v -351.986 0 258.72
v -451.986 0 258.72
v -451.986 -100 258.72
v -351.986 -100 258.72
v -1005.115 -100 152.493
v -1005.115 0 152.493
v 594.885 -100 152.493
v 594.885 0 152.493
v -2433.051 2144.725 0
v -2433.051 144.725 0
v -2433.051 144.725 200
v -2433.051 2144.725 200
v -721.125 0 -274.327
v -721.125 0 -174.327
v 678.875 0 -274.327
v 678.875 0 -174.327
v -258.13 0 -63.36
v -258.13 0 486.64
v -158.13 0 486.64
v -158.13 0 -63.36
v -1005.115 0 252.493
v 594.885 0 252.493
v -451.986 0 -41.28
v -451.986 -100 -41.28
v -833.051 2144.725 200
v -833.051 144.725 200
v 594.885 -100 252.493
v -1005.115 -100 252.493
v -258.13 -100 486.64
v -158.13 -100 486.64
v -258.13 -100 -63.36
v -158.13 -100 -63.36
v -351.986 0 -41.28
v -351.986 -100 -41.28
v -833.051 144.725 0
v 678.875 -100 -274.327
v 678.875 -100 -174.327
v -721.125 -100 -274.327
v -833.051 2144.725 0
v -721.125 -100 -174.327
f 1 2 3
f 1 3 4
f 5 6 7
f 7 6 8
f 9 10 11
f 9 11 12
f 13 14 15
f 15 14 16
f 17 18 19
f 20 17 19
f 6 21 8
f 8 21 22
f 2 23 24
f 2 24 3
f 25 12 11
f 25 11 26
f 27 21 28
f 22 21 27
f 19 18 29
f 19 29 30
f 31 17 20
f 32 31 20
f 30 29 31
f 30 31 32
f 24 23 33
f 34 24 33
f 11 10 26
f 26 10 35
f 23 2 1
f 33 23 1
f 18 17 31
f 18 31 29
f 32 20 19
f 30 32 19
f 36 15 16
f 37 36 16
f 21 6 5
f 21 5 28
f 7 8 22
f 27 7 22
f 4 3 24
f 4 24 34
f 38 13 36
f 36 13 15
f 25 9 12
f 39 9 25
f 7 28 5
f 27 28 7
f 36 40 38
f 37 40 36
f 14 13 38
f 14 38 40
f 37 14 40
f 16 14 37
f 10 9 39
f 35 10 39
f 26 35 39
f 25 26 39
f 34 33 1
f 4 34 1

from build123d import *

# Parameters (mm, degrees)
F0_W     = 100
F0_H     = 300
F1_DEPTH = 100
F2_W     = 100
F2_H     = 550
F3_DEPTH = 100
F4_W     = 1600
F4_H     = 100
F5_DEPTH = 100
F6_W     = 1400
F6_H     = 100
F7_DEPTH = 100
F8_W     = 1600
F8_H     = 2000
F9_DEPTH = 200


with BuildPart() as f1:
    # F0 (on Front) → F1 (new body)
    with BuildSketch(Plane.XZ):
        with Locations((-401.98589, 108.719756)):
            Rectangle(F0_W, F0_H)
    extrude(amount=F1_DEPTH)


with BuildPart() as f3:
    # F2 (on Front) → F3 (new body)
    with BuildSketch(Plane.XZ):
        with Locations((-208.130044, 211.639816)):
            Rectangle(F2_W, F2_H)
    extrude(amount=F3_DEPTH)


with BuildPart() as f5:
    # F4 (on Front) → F5 (new body)
    with BuildSketch(Plane.XZ):
        with Locations((-205.114889, 202.493179)):
            Rectangle(F4_W, F4_H)
    extrude(amount=F5_DEPTH)


with BuildPart() as f7:
    # F6 (on Front) → F7 (new body)
    with BuildSketch(Plane.XZ):
        with Locations((-21.124852, -224.327159)):
            Rectangle(F6_W, F6_H)
    extrude(amount=F7_DEPTH)


with BuildPart() as f9:
    # F8 (on Top) → F9 (new body)
    with BuildSketch(Plane.XY):
        with Locations((-1633.050549, 1144.725144)):
            Rectangle(F8_W, F8_H)
    extrude(amount=F9_DEPTH)


solid = Compound([f1.part, f3.part, f5.part, f7.part, f9.part])
